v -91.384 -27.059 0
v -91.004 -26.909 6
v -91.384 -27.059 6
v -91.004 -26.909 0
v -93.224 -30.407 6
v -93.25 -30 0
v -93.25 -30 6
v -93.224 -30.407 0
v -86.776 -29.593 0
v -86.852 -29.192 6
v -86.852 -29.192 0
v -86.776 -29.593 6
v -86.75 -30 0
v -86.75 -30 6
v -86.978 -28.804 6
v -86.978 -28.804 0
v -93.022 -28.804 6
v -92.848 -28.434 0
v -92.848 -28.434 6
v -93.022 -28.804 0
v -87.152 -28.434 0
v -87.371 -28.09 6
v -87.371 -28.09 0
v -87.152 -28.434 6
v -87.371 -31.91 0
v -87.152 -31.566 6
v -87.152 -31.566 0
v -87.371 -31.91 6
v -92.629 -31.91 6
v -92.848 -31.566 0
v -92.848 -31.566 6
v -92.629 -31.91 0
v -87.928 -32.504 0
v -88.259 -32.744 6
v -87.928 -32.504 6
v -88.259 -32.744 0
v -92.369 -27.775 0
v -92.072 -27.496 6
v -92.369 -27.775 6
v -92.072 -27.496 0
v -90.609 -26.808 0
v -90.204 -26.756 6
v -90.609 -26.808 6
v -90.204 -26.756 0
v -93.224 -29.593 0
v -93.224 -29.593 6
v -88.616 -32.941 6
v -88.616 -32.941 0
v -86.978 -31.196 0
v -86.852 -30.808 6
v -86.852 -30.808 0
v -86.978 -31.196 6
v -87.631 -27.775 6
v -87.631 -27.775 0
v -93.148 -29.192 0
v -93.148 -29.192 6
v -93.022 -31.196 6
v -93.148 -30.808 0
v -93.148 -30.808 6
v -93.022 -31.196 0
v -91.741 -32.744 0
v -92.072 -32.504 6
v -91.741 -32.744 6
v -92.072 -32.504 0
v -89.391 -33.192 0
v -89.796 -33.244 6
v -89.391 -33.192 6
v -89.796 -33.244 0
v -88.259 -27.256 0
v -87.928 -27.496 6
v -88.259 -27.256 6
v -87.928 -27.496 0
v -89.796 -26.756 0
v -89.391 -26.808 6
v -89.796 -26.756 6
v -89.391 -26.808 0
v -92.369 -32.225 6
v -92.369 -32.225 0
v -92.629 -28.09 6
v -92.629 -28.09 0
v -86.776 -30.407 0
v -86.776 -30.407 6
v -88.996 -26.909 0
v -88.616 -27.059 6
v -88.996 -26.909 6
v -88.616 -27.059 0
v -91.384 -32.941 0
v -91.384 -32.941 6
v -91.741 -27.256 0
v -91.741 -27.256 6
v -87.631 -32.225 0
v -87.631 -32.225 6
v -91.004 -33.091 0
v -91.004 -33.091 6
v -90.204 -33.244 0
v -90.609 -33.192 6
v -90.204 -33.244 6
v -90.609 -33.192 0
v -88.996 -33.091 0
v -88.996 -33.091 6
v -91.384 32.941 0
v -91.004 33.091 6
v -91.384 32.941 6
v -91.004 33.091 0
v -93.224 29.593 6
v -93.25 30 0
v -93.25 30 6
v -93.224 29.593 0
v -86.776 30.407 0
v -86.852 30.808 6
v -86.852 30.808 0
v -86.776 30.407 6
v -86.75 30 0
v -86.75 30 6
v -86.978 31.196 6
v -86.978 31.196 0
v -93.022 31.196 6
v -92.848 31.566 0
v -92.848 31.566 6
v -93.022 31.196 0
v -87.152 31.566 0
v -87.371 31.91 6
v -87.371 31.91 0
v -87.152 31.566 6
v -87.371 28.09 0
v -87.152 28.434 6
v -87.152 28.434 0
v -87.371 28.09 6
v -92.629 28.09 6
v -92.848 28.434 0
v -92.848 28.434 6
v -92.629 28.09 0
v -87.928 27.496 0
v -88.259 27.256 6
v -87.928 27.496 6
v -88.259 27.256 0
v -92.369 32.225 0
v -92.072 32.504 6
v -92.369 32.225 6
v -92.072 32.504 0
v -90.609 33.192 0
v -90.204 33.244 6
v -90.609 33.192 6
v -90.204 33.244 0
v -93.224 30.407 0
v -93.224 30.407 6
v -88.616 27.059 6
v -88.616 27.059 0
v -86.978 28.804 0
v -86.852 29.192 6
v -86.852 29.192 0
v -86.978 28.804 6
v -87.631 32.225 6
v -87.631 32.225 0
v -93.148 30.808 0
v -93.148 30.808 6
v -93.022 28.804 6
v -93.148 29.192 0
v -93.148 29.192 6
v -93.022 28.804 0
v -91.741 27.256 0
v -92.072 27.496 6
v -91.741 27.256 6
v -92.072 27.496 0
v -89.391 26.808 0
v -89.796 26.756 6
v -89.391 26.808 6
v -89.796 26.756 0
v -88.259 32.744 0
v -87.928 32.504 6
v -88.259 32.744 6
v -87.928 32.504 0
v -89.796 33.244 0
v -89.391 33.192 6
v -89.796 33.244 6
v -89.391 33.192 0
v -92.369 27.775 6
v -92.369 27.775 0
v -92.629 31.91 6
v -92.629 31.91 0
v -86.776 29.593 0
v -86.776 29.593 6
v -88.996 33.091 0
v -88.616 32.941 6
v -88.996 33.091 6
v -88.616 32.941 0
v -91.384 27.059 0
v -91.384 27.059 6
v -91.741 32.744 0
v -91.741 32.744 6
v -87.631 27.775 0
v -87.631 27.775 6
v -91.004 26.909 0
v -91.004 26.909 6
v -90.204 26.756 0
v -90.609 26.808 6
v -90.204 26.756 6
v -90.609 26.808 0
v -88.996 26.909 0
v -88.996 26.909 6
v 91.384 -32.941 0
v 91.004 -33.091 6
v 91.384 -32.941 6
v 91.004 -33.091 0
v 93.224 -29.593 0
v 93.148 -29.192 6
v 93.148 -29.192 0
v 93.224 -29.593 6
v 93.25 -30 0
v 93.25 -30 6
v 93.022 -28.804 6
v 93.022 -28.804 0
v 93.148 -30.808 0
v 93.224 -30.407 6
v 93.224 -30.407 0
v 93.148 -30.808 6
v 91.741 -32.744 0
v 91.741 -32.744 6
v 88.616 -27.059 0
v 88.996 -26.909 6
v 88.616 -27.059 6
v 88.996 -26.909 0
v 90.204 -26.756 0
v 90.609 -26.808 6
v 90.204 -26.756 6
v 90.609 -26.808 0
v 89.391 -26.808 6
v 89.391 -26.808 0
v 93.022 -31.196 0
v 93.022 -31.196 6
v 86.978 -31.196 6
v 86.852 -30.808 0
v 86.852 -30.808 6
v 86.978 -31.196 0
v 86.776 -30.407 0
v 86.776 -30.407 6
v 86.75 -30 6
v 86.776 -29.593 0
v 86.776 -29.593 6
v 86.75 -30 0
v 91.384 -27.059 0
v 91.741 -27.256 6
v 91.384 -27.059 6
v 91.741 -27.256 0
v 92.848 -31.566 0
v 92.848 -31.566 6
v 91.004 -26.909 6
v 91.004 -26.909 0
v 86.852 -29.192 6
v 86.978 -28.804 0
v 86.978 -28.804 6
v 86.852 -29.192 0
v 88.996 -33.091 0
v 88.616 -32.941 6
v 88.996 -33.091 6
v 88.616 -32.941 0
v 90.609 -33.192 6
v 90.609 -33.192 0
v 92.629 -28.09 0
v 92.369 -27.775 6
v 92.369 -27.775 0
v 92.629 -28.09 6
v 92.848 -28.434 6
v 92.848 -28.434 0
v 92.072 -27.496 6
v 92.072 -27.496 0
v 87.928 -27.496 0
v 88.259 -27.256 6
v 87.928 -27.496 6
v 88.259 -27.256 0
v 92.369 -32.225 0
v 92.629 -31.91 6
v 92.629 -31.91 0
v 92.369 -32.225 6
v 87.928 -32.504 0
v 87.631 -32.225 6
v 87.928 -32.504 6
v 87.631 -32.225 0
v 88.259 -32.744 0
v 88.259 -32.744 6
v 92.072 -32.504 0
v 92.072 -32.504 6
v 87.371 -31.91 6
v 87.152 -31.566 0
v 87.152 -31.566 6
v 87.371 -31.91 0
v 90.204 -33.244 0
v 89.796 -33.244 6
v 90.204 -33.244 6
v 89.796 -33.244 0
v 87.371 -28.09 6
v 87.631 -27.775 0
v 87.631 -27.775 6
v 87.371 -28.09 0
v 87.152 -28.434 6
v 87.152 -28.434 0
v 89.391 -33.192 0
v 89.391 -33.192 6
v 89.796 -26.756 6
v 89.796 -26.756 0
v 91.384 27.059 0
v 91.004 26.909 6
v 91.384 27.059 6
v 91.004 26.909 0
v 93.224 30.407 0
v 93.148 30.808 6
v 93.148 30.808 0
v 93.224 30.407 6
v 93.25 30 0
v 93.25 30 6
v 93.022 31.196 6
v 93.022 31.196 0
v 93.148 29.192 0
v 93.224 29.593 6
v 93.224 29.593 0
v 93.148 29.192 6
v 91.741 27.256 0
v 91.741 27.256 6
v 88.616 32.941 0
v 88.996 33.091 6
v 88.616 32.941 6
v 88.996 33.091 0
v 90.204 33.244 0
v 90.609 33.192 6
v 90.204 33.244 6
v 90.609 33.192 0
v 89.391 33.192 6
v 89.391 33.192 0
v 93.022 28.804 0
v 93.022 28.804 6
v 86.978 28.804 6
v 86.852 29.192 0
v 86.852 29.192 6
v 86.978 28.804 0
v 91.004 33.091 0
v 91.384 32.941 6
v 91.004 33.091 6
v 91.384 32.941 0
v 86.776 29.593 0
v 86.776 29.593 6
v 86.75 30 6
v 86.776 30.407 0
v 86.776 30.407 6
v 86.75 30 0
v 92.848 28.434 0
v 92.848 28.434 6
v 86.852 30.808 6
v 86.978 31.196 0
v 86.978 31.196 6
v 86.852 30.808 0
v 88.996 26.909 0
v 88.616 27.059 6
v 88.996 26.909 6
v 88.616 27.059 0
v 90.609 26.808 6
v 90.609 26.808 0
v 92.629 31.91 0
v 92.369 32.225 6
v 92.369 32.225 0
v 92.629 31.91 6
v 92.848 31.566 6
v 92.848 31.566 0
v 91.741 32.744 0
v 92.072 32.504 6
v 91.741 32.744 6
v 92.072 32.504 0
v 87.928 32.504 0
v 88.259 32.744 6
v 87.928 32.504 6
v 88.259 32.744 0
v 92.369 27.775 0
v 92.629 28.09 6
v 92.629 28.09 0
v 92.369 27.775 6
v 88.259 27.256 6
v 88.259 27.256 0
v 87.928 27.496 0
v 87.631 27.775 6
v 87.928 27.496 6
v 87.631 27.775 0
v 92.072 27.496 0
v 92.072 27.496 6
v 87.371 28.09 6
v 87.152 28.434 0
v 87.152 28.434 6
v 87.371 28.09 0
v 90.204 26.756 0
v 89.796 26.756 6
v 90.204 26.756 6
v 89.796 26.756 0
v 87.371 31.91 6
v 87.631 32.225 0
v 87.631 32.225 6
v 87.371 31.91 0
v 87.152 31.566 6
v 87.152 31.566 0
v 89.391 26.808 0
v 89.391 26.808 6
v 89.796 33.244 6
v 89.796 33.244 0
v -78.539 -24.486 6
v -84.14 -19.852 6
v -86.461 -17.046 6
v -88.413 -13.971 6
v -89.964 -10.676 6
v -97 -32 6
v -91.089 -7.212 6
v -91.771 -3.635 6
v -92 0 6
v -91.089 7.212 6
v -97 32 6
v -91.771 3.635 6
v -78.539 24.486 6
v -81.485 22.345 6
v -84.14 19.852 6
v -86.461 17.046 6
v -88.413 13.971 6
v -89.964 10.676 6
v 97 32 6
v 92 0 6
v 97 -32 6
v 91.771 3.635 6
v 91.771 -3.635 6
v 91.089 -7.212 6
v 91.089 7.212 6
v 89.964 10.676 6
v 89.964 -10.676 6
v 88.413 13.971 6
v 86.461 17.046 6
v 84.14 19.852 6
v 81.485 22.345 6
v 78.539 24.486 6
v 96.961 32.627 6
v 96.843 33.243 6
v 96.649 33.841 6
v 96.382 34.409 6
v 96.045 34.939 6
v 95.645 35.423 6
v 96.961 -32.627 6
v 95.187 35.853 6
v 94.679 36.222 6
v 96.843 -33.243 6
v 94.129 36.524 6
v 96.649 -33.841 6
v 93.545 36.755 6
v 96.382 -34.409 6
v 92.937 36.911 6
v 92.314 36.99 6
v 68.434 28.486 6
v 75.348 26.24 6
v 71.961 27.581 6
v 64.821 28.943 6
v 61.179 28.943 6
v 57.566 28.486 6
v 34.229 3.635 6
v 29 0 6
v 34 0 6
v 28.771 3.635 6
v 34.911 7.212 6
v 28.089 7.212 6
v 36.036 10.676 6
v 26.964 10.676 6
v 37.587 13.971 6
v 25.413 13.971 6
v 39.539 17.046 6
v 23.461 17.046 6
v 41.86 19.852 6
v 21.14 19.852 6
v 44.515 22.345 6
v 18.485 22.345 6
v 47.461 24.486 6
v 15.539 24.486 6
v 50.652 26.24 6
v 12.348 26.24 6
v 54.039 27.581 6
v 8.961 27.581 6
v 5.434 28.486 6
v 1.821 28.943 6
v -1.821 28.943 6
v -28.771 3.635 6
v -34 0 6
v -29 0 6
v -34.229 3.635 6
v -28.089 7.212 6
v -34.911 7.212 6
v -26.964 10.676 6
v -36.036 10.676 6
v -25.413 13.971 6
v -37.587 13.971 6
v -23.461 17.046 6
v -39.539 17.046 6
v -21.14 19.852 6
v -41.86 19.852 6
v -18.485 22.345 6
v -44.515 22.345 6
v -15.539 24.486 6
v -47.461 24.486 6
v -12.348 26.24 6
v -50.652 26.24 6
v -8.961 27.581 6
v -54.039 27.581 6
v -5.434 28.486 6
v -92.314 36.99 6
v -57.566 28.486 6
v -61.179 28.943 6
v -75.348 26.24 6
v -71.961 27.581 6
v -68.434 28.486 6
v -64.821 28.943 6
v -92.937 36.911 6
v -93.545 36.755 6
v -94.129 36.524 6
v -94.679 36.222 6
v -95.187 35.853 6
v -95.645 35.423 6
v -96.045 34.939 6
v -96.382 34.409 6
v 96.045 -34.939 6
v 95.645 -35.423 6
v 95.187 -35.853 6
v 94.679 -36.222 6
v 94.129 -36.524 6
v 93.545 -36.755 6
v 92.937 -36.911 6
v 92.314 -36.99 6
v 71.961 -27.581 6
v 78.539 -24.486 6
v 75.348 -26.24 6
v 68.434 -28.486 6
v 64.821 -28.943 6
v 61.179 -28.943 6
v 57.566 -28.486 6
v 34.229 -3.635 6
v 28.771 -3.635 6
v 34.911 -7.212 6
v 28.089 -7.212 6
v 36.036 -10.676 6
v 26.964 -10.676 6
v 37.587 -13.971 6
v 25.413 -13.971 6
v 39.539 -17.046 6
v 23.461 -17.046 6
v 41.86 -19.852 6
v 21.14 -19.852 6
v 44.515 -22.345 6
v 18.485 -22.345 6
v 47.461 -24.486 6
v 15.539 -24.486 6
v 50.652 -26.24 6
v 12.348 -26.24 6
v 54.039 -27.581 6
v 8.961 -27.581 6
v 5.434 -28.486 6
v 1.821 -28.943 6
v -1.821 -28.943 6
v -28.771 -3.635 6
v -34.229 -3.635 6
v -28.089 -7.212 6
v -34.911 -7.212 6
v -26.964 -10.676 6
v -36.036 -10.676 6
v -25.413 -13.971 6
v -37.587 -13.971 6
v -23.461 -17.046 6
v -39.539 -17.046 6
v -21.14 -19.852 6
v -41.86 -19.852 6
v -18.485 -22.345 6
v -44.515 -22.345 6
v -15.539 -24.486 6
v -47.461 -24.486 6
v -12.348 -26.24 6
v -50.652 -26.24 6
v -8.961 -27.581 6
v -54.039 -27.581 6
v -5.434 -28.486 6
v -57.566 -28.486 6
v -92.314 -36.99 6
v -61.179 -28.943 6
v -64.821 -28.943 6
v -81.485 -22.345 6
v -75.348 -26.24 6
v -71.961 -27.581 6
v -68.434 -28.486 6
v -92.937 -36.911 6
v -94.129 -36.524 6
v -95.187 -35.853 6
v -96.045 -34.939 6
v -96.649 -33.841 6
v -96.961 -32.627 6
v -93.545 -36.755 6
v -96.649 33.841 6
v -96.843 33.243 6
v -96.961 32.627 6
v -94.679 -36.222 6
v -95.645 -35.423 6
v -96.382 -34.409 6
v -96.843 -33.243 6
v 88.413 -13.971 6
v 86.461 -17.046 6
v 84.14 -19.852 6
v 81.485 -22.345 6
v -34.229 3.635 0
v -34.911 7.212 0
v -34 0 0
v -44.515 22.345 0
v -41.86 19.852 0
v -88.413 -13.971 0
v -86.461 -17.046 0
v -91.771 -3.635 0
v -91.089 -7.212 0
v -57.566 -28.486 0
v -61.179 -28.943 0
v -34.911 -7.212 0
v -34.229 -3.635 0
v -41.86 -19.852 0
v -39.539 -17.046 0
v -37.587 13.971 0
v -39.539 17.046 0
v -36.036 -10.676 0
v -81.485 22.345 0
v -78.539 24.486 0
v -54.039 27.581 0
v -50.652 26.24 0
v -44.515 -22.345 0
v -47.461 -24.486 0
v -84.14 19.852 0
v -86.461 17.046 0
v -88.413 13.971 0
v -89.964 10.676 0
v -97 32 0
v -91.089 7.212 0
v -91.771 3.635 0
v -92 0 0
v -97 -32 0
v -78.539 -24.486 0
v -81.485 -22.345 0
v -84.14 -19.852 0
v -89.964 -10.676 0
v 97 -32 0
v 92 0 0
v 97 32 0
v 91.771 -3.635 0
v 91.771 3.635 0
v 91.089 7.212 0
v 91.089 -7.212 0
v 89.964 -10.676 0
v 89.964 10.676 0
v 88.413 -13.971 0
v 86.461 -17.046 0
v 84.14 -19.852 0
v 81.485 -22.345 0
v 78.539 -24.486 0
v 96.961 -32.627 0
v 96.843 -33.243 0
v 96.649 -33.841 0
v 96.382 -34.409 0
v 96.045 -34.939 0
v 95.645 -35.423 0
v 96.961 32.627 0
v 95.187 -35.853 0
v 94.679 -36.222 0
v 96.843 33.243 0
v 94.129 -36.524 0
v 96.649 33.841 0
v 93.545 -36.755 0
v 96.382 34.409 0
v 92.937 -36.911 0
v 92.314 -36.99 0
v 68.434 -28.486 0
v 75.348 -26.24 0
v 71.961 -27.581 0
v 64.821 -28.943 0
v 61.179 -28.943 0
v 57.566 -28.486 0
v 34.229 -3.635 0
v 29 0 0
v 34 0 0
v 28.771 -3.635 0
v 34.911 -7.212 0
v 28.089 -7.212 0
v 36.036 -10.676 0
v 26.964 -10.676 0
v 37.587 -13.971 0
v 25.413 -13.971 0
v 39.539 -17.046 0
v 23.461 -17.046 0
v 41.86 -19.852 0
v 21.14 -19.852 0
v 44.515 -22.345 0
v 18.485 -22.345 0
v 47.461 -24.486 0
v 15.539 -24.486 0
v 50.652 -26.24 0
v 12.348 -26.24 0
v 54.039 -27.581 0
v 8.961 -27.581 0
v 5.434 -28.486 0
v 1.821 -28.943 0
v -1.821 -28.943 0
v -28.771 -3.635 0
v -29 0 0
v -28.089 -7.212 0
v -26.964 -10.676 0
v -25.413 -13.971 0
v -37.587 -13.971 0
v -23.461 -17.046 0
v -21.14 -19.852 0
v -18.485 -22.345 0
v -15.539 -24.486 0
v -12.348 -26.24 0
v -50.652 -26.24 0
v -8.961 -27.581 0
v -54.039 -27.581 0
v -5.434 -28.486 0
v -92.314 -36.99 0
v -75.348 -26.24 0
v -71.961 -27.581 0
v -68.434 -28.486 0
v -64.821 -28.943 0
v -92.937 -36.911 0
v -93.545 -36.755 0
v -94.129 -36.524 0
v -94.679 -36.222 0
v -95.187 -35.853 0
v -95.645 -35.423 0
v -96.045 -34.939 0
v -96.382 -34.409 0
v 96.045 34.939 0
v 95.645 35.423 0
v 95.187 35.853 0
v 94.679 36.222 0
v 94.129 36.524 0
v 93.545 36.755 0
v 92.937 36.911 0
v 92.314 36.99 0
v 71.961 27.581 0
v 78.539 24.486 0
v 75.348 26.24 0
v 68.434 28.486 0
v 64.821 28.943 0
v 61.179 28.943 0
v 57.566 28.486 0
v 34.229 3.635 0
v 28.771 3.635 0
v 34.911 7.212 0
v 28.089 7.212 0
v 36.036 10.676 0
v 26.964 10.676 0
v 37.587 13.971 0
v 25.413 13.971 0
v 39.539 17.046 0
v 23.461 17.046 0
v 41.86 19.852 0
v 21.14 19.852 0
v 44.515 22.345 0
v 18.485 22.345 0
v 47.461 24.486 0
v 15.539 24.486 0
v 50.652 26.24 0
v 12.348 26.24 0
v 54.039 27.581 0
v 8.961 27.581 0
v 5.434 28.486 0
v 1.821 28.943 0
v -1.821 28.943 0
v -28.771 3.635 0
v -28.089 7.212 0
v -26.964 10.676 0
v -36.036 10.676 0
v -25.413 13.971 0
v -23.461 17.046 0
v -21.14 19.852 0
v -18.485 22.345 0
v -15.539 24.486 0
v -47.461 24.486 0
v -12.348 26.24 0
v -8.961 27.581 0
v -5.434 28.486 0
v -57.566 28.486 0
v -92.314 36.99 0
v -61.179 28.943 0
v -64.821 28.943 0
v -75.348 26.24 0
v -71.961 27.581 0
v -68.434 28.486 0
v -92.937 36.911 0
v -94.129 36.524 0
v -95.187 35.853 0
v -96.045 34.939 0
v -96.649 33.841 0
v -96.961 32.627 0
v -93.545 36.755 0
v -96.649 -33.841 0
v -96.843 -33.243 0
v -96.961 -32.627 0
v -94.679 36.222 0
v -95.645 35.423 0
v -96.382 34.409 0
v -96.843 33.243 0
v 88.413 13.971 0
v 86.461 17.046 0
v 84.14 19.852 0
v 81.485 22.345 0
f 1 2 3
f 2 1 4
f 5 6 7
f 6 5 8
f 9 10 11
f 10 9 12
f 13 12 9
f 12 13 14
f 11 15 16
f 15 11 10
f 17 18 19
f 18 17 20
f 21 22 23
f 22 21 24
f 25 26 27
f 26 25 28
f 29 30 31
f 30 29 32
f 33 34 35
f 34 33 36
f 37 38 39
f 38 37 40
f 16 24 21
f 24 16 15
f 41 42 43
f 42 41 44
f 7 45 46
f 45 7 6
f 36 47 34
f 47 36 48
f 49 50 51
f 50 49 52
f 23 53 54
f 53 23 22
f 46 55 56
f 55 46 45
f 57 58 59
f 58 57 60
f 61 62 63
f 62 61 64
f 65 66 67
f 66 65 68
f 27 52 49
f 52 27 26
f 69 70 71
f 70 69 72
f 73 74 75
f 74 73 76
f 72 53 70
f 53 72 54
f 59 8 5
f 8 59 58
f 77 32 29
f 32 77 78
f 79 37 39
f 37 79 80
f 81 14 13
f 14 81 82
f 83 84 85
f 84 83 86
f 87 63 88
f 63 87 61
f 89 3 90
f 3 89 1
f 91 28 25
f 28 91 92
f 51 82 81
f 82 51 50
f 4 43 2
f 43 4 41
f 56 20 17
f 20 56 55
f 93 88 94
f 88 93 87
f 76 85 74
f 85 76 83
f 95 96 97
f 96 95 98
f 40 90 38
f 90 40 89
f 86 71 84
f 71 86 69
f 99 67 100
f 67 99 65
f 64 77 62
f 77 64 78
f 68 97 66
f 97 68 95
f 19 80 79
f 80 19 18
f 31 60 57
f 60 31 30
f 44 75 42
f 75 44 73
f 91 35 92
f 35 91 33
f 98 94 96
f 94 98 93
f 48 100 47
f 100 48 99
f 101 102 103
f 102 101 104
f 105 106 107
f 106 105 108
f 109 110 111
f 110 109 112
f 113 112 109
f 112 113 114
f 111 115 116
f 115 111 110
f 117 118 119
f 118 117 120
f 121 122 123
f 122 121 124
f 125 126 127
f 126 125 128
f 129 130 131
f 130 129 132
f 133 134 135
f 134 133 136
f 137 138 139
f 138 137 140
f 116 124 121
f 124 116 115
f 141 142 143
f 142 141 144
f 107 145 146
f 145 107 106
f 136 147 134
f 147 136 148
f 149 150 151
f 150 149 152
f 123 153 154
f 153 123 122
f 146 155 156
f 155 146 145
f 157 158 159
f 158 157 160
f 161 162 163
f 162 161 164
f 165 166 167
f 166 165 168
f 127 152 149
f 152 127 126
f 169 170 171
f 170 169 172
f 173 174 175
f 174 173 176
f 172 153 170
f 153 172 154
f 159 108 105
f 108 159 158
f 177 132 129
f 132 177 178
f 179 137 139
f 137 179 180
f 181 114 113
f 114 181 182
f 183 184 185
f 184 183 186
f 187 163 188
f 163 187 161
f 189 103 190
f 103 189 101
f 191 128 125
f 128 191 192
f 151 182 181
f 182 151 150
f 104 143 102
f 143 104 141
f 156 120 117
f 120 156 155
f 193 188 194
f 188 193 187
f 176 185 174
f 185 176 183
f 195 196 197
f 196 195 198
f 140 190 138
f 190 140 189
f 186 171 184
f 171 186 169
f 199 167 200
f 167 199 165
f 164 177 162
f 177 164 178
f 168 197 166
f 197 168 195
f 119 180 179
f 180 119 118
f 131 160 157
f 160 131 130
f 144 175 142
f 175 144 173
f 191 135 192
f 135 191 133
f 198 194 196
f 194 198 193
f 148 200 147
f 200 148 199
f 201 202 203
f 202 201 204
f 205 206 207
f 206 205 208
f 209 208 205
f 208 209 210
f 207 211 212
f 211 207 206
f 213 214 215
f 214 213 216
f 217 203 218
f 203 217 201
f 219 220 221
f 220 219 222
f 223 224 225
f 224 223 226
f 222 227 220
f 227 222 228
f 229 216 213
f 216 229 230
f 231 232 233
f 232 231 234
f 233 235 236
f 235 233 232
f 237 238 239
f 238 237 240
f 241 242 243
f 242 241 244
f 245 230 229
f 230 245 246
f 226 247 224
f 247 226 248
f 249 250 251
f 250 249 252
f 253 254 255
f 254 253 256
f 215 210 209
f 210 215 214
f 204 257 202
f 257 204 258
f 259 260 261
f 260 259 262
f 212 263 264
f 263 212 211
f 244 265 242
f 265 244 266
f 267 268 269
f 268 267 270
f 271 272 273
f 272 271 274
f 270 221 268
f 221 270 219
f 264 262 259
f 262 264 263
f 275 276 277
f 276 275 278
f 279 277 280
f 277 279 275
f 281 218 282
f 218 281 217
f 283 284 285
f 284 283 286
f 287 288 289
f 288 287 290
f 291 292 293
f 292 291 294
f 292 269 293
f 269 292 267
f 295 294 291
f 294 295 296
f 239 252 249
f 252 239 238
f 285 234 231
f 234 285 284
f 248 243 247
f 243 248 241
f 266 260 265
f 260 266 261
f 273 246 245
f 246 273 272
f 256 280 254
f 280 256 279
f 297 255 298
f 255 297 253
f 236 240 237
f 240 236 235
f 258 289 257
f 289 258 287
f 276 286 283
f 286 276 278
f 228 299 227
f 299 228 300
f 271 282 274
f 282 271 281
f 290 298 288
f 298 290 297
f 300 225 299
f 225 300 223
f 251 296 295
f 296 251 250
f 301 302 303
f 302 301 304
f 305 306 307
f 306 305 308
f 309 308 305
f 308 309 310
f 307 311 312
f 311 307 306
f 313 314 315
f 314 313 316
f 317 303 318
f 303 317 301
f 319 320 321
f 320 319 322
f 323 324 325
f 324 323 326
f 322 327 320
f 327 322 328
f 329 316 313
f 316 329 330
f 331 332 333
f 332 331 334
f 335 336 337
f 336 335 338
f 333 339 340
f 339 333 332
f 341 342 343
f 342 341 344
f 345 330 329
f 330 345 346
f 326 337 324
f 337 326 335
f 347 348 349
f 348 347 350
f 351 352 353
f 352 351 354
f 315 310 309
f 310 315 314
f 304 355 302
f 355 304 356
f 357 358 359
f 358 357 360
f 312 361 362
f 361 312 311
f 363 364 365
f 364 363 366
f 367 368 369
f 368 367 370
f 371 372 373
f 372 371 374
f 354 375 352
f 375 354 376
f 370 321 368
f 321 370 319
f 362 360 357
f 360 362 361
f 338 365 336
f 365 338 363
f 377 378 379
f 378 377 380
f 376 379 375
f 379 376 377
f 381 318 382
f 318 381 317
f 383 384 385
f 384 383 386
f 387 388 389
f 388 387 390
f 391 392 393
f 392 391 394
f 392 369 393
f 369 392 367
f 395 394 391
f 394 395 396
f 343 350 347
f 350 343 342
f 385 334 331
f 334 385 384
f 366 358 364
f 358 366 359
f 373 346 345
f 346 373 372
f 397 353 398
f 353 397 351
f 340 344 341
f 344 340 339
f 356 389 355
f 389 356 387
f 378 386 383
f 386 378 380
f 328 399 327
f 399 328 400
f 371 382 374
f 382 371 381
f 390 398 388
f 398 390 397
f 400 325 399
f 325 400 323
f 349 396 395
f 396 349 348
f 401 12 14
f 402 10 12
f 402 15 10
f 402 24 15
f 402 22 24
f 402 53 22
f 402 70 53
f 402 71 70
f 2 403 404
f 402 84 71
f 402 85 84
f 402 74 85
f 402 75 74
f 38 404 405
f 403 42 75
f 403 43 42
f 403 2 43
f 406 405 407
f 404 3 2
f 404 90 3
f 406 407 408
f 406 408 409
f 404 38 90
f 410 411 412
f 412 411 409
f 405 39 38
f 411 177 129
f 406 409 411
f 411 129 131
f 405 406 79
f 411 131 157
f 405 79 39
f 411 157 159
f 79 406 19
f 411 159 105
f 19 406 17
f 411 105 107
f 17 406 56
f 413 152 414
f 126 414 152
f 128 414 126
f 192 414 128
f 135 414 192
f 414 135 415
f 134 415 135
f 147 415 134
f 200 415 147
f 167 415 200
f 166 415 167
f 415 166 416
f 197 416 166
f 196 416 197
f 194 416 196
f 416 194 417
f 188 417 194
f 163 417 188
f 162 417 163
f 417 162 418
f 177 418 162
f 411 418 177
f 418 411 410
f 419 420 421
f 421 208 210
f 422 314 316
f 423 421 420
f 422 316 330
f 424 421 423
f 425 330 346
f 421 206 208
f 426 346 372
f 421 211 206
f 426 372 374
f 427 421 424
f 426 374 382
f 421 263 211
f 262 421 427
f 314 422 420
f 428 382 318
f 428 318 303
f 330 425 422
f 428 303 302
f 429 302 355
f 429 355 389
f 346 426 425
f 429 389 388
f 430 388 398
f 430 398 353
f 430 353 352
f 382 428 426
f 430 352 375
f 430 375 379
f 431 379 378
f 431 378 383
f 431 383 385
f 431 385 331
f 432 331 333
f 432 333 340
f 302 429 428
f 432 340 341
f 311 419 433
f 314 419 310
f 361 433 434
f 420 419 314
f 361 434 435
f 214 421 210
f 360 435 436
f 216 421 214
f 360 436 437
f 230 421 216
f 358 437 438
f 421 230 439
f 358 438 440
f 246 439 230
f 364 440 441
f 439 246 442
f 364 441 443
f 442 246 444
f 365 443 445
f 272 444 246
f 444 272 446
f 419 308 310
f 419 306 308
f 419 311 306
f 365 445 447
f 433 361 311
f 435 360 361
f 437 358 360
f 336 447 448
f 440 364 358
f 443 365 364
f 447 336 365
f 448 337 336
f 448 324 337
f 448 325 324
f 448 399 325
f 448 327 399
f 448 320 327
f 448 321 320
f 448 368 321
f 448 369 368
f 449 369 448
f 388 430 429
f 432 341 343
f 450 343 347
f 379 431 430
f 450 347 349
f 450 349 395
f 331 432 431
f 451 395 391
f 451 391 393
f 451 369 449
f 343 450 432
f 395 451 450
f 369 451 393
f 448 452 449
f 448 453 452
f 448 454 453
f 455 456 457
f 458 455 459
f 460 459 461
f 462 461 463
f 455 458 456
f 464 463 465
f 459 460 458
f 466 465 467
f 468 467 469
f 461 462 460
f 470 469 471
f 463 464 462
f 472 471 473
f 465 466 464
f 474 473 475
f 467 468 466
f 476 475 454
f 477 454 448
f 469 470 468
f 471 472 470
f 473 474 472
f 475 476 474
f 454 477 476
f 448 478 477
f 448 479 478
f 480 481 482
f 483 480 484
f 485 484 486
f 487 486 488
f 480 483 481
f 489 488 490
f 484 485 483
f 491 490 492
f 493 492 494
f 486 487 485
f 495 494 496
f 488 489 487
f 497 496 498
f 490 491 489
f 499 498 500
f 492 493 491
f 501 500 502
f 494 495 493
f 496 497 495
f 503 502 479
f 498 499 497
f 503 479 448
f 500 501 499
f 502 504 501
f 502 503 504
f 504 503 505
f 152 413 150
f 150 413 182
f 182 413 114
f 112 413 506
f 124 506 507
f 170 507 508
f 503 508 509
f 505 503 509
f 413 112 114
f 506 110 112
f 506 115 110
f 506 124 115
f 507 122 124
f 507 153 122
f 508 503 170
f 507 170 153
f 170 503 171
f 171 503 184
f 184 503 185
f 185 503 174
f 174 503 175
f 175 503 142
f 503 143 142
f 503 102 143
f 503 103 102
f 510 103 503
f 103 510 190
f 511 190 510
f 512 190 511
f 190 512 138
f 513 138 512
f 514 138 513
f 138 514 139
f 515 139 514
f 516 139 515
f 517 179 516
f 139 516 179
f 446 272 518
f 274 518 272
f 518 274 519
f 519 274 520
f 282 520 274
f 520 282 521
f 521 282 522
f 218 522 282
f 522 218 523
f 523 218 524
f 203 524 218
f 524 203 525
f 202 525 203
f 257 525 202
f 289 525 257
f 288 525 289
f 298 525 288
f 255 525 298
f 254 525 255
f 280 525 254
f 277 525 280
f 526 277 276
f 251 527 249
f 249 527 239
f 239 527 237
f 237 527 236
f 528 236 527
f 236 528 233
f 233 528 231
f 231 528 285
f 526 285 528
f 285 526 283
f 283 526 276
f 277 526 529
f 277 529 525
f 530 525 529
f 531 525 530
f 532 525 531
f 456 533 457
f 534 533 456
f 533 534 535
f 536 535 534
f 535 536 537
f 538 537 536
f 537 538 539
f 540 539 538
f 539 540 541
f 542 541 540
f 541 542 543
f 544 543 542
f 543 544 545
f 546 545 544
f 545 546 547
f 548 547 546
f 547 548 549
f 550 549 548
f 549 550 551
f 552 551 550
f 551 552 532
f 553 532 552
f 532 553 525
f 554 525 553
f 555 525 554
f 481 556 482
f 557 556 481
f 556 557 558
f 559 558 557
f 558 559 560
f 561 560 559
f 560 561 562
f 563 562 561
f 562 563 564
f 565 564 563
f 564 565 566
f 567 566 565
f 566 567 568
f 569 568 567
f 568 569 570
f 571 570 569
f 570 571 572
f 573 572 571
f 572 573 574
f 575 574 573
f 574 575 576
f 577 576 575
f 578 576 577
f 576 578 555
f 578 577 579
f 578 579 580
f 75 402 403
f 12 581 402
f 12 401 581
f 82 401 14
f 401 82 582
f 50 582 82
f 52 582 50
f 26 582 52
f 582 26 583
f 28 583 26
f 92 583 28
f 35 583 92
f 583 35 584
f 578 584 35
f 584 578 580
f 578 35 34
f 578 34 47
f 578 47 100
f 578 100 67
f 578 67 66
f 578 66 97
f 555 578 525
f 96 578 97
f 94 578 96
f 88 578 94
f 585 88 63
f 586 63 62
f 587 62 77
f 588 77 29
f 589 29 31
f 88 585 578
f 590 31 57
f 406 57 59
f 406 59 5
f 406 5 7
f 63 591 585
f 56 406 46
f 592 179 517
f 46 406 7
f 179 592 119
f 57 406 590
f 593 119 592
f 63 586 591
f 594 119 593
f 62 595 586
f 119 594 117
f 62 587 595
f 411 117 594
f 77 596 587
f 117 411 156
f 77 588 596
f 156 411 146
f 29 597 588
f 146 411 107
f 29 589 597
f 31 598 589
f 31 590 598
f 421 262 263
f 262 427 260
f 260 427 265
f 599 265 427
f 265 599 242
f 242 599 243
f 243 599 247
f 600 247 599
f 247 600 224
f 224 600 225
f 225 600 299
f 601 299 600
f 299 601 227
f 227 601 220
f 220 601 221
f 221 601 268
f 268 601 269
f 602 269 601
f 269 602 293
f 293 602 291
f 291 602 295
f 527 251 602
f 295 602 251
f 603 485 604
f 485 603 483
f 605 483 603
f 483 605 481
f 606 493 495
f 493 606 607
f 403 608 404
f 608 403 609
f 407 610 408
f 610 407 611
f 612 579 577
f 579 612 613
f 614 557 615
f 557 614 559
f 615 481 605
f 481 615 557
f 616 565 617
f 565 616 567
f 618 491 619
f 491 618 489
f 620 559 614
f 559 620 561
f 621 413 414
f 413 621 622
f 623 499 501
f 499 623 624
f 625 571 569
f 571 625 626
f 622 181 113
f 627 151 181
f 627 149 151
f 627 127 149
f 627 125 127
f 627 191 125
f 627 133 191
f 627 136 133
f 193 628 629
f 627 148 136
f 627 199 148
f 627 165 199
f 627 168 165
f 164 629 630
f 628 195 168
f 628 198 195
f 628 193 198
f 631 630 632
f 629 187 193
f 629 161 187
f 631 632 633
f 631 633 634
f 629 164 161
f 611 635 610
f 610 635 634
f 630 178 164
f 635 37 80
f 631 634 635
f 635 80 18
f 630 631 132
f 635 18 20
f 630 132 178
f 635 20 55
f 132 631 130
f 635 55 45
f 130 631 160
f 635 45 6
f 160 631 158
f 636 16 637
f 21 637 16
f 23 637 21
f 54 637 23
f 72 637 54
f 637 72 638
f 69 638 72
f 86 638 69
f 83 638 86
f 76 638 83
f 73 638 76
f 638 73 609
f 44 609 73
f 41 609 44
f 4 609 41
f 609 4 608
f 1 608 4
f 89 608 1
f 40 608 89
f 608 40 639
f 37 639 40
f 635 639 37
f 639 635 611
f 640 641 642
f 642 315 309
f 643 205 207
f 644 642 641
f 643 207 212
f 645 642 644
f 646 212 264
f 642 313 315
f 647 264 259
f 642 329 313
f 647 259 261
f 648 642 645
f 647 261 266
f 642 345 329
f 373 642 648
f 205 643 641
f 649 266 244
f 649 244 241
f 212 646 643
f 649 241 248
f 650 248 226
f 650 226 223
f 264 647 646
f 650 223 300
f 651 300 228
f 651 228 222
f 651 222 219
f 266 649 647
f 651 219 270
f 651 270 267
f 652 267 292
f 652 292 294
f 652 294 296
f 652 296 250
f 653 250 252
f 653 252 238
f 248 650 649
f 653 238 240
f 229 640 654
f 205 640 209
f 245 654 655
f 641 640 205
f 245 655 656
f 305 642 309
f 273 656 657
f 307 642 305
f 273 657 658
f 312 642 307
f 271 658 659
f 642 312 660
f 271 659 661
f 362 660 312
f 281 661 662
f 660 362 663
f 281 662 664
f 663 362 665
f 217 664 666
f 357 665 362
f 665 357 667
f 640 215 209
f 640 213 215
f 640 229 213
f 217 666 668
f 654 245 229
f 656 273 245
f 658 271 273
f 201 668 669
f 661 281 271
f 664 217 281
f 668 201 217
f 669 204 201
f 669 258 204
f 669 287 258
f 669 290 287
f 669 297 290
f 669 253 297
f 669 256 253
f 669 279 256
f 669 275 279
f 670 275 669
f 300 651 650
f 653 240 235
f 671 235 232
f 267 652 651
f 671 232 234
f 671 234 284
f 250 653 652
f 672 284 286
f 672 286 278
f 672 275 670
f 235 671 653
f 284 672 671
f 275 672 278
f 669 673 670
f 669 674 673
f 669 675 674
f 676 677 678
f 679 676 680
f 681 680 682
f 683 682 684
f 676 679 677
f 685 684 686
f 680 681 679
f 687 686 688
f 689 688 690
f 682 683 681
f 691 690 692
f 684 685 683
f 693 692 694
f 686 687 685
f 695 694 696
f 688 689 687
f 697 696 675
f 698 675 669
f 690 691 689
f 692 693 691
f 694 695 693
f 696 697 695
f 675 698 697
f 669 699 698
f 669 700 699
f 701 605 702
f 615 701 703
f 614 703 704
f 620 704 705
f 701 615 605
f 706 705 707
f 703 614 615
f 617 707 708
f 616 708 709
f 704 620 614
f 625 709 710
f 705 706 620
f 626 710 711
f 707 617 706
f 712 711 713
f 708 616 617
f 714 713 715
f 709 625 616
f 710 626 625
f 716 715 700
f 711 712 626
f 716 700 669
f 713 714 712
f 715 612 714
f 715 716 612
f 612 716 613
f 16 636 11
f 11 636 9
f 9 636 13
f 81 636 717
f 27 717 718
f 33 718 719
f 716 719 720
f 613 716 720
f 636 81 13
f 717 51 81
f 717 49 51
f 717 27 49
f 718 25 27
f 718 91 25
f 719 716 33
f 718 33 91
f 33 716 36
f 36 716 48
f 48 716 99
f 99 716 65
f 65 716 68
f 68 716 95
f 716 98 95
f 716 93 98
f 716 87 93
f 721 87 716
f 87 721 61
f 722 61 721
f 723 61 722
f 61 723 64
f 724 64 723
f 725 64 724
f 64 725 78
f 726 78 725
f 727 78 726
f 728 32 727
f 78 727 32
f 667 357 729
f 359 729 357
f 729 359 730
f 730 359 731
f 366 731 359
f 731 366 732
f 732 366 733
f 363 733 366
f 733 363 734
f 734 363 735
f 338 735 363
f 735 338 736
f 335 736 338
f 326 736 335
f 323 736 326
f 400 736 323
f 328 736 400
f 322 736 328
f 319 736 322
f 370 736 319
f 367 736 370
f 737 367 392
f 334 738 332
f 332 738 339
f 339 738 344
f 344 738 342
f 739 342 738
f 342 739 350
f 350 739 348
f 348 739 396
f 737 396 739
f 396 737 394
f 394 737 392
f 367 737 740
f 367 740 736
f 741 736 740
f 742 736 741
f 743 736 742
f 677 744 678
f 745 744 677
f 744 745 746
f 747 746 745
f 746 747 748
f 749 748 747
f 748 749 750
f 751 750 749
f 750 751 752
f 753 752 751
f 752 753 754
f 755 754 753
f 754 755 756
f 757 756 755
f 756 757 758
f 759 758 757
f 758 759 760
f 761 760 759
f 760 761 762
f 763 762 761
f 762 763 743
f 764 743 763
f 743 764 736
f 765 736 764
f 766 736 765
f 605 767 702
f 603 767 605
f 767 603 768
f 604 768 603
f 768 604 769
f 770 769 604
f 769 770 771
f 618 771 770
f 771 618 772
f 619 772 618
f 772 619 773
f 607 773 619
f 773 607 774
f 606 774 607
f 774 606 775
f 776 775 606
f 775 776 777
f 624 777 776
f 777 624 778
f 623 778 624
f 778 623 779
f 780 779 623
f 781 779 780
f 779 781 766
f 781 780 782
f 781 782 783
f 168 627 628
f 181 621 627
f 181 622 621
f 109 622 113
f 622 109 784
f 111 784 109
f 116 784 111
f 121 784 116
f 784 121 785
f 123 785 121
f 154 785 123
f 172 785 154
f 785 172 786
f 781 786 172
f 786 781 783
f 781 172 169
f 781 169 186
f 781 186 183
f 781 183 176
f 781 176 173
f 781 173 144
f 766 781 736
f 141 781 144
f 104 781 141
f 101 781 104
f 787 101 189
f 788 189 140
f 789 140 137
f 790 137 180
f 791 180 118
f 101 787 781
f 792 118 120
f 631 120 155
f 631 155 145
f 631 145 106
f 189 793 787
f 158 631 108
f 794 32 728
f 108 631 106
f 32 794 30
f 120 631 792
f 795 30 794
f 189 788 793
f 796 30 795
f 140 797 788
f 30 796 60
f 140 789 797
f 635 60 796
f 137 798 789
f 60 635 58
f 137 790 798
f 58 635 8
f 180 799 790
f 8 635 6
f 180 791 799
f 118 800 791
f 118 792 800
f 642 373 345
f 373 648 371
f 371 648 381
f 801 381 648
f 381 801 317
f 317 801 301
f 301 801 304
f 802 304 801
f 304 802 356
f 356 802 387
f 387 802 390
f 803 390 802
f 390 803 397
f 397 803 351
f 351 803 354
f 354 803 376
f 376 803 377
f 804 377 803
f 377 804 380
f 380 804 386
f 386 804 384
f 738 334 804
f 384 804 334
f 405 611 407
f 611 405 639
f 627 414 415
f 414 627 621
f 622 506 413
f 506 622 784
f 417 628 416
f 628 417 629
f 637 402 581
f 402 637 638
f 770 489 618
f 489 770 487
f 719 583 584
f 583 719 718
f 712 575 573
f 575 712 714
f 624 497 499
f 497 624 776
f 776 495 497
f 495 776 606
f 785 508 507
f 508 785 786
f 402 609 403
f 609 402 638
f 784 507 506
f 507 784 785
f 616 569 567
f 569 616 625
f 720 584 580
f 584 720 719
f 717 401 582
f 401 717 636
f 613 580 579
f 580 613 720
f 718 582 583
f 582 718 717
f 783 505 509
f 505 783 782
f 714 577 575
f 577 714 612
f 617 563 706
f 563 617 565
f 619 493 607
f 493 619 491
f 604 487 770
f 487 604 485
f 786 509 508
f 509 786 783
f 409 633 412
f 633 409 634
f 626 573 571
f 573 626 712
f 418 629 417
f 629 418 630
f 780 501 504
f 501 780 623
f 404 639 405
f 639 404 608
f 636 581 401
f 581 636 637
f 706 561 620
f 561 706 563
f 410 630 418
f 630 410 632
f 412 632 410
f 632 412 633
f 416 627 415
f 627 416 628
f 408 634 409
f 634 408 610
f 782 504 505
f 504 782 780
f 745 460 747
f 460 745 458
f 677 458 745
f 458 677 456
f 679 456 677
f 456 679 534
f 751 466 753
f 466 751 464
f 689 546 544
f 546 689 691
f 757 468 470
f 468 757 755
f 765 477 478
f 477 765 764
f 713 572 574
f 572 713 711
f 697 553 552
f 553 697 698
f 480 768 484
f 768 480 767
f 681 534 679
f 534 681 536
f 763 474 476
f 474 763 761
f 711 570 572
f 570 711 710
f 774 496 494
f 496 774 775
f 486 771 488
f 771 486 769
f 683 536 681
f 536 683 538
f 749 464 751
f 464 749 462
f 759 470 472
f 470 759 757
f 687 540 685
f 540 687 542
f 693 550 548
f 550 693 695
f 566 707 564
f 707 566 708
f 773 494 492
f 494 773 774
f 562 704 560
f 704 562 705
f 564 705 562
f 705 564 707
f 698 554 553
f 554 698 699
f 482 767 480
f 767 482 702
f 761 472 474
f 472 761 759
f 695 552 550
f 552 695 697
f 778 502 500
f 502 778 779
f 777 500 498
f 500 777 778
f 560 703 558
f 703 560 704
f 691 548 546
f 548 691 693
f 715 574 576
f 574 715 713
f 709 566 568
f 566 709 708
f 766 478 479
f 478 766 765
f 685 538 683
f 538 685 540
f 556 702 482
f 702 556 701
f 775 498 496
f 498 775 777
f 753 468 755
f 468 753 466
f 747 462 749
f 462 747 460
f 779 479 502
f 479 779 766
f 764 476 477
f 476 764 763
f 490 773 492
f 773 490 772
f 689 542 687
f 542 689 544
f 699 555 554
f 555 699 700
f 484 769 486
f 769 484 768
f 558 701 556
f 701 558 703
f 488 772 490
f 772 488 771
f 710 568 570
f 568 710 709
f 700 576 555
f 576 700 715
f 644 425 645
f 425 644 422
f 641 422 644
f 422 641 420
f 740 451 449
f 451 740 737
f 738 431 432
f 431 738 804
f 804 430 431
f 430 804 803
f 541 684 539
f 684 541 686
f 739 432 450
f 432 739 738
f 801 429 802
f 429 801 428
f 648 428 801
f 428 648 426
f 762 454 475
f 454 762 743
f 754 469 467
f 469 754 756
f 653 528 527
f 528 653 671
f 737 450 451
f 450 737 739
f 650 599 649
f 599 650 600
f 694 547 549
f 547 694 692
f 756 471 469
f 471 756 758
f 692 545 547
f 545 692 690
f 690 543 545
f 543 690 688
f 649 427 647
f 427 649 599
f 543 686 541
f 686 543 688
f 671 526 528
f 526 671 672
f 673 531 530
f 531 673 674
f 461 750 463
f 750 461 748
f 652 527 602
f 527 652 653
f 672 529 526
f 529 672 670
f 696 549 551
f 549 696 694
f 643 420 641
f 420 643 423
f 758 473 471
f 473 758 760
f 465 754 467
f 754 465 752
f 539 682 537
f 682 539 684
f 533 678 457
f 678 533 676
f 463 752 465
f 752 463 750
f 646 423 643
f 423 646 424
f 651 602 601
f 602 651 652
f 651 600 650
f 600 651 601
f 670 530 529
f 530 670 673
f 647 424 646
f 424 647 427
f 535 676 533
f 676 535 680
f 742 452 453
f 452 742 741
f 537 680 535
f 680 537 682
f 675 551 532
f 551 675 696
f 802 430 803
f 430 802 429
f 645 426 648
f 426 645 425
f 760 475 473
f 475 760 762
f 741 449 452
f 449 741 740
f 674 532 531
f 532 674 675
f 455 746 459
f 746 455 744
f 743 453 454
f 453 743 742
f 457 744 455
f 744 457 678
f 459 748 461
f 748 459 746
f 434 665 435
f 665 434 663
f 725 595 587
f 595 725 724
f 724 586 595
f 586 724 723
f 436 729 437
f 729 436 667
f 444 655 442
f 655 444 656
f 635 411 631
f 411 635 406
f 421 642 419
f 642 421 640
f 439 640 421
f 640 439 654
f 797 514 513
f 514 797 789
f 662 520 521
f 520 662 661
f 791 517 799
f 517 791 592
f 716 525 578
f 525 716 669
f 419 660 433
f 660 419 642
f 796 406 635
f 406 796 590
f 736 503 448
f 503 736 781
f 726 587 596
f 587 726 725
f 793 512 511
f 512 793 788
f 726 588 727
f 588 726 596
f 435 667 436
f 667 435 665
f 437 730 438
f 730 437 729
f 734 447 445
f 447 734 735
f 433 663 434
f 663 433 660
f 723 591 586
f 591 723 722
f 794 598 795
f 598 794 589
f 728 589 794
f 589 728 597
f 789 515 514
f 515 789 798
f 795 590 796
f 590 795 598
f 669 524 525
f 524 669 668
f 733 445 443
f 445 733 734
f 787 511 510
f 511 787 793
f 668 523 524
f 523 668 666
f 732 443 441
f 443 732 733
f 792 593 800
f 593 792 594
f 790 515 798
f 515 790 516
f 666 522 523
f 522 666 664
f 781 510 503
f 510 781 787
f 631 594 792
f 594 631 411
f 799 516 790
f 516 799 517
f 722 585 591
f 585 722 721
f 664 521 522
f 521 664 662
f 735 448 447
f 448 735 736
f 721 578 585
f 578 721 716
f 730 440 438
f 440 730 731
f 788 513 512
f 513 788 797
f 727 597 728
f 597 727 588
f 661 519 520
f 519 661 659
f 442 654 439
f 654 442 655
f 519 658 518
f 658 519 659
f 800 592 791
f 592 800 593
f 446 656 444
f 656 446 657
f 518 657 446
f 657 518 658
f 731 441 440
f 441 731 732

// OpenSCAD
$fn = 50;


difference() {
	union() {
		hull() {
			translate(v = [-92.0000000000, 32.0000000000, 0]) {
				cylinder(h = 6, r = 5);
			}
			translate(v = [92.0000000000, 32.0000000000, 0]) {
				cylinder(h = 6, r = 5);
			}
			translate(v = [-92.0000000000, -32.0000000000, 0]) {
				cylinder(h = 6, r = 5);
			}
			translate(v = [92.0000000000, -32.0000000000, 0]) {
				cylinder(h = 6, r = 5);
			}
		}
	}
	union() {
		#translate(v = [-90.0000000000, -30.0000000000, -100.0000000000]) {
			cylinder(h = 200, r = 3.2500000000);
		}
		#translate(v = [-90.0000000000, 30.0000000000, -100.0000000000]) {
			cylinder(h = 200, r = 3.2500000000);
		}
		#translate(v = [90.0000000000, -30.0000000000, -100.0000000000]) {
			cylinder(h = 200, r = 3.2500000000);
		}
		#translate(v = [90.0000000000, 30.0000000000, -100.0000000000]) {
			cylinder(h = 200, r = 3.2500000000);
		}
		#translate(v = [-63.0000000000, 0, 0]) {
			cylinder(h = 6, r = 29.0000000000);
		}
		#cylinder(h = 6, r = 29.0000000000);
		#translate(v = [63.0000000000, 0, 0]) {
			cylinder(h = 6, r = 29.0000000000);
		}
	}
}
